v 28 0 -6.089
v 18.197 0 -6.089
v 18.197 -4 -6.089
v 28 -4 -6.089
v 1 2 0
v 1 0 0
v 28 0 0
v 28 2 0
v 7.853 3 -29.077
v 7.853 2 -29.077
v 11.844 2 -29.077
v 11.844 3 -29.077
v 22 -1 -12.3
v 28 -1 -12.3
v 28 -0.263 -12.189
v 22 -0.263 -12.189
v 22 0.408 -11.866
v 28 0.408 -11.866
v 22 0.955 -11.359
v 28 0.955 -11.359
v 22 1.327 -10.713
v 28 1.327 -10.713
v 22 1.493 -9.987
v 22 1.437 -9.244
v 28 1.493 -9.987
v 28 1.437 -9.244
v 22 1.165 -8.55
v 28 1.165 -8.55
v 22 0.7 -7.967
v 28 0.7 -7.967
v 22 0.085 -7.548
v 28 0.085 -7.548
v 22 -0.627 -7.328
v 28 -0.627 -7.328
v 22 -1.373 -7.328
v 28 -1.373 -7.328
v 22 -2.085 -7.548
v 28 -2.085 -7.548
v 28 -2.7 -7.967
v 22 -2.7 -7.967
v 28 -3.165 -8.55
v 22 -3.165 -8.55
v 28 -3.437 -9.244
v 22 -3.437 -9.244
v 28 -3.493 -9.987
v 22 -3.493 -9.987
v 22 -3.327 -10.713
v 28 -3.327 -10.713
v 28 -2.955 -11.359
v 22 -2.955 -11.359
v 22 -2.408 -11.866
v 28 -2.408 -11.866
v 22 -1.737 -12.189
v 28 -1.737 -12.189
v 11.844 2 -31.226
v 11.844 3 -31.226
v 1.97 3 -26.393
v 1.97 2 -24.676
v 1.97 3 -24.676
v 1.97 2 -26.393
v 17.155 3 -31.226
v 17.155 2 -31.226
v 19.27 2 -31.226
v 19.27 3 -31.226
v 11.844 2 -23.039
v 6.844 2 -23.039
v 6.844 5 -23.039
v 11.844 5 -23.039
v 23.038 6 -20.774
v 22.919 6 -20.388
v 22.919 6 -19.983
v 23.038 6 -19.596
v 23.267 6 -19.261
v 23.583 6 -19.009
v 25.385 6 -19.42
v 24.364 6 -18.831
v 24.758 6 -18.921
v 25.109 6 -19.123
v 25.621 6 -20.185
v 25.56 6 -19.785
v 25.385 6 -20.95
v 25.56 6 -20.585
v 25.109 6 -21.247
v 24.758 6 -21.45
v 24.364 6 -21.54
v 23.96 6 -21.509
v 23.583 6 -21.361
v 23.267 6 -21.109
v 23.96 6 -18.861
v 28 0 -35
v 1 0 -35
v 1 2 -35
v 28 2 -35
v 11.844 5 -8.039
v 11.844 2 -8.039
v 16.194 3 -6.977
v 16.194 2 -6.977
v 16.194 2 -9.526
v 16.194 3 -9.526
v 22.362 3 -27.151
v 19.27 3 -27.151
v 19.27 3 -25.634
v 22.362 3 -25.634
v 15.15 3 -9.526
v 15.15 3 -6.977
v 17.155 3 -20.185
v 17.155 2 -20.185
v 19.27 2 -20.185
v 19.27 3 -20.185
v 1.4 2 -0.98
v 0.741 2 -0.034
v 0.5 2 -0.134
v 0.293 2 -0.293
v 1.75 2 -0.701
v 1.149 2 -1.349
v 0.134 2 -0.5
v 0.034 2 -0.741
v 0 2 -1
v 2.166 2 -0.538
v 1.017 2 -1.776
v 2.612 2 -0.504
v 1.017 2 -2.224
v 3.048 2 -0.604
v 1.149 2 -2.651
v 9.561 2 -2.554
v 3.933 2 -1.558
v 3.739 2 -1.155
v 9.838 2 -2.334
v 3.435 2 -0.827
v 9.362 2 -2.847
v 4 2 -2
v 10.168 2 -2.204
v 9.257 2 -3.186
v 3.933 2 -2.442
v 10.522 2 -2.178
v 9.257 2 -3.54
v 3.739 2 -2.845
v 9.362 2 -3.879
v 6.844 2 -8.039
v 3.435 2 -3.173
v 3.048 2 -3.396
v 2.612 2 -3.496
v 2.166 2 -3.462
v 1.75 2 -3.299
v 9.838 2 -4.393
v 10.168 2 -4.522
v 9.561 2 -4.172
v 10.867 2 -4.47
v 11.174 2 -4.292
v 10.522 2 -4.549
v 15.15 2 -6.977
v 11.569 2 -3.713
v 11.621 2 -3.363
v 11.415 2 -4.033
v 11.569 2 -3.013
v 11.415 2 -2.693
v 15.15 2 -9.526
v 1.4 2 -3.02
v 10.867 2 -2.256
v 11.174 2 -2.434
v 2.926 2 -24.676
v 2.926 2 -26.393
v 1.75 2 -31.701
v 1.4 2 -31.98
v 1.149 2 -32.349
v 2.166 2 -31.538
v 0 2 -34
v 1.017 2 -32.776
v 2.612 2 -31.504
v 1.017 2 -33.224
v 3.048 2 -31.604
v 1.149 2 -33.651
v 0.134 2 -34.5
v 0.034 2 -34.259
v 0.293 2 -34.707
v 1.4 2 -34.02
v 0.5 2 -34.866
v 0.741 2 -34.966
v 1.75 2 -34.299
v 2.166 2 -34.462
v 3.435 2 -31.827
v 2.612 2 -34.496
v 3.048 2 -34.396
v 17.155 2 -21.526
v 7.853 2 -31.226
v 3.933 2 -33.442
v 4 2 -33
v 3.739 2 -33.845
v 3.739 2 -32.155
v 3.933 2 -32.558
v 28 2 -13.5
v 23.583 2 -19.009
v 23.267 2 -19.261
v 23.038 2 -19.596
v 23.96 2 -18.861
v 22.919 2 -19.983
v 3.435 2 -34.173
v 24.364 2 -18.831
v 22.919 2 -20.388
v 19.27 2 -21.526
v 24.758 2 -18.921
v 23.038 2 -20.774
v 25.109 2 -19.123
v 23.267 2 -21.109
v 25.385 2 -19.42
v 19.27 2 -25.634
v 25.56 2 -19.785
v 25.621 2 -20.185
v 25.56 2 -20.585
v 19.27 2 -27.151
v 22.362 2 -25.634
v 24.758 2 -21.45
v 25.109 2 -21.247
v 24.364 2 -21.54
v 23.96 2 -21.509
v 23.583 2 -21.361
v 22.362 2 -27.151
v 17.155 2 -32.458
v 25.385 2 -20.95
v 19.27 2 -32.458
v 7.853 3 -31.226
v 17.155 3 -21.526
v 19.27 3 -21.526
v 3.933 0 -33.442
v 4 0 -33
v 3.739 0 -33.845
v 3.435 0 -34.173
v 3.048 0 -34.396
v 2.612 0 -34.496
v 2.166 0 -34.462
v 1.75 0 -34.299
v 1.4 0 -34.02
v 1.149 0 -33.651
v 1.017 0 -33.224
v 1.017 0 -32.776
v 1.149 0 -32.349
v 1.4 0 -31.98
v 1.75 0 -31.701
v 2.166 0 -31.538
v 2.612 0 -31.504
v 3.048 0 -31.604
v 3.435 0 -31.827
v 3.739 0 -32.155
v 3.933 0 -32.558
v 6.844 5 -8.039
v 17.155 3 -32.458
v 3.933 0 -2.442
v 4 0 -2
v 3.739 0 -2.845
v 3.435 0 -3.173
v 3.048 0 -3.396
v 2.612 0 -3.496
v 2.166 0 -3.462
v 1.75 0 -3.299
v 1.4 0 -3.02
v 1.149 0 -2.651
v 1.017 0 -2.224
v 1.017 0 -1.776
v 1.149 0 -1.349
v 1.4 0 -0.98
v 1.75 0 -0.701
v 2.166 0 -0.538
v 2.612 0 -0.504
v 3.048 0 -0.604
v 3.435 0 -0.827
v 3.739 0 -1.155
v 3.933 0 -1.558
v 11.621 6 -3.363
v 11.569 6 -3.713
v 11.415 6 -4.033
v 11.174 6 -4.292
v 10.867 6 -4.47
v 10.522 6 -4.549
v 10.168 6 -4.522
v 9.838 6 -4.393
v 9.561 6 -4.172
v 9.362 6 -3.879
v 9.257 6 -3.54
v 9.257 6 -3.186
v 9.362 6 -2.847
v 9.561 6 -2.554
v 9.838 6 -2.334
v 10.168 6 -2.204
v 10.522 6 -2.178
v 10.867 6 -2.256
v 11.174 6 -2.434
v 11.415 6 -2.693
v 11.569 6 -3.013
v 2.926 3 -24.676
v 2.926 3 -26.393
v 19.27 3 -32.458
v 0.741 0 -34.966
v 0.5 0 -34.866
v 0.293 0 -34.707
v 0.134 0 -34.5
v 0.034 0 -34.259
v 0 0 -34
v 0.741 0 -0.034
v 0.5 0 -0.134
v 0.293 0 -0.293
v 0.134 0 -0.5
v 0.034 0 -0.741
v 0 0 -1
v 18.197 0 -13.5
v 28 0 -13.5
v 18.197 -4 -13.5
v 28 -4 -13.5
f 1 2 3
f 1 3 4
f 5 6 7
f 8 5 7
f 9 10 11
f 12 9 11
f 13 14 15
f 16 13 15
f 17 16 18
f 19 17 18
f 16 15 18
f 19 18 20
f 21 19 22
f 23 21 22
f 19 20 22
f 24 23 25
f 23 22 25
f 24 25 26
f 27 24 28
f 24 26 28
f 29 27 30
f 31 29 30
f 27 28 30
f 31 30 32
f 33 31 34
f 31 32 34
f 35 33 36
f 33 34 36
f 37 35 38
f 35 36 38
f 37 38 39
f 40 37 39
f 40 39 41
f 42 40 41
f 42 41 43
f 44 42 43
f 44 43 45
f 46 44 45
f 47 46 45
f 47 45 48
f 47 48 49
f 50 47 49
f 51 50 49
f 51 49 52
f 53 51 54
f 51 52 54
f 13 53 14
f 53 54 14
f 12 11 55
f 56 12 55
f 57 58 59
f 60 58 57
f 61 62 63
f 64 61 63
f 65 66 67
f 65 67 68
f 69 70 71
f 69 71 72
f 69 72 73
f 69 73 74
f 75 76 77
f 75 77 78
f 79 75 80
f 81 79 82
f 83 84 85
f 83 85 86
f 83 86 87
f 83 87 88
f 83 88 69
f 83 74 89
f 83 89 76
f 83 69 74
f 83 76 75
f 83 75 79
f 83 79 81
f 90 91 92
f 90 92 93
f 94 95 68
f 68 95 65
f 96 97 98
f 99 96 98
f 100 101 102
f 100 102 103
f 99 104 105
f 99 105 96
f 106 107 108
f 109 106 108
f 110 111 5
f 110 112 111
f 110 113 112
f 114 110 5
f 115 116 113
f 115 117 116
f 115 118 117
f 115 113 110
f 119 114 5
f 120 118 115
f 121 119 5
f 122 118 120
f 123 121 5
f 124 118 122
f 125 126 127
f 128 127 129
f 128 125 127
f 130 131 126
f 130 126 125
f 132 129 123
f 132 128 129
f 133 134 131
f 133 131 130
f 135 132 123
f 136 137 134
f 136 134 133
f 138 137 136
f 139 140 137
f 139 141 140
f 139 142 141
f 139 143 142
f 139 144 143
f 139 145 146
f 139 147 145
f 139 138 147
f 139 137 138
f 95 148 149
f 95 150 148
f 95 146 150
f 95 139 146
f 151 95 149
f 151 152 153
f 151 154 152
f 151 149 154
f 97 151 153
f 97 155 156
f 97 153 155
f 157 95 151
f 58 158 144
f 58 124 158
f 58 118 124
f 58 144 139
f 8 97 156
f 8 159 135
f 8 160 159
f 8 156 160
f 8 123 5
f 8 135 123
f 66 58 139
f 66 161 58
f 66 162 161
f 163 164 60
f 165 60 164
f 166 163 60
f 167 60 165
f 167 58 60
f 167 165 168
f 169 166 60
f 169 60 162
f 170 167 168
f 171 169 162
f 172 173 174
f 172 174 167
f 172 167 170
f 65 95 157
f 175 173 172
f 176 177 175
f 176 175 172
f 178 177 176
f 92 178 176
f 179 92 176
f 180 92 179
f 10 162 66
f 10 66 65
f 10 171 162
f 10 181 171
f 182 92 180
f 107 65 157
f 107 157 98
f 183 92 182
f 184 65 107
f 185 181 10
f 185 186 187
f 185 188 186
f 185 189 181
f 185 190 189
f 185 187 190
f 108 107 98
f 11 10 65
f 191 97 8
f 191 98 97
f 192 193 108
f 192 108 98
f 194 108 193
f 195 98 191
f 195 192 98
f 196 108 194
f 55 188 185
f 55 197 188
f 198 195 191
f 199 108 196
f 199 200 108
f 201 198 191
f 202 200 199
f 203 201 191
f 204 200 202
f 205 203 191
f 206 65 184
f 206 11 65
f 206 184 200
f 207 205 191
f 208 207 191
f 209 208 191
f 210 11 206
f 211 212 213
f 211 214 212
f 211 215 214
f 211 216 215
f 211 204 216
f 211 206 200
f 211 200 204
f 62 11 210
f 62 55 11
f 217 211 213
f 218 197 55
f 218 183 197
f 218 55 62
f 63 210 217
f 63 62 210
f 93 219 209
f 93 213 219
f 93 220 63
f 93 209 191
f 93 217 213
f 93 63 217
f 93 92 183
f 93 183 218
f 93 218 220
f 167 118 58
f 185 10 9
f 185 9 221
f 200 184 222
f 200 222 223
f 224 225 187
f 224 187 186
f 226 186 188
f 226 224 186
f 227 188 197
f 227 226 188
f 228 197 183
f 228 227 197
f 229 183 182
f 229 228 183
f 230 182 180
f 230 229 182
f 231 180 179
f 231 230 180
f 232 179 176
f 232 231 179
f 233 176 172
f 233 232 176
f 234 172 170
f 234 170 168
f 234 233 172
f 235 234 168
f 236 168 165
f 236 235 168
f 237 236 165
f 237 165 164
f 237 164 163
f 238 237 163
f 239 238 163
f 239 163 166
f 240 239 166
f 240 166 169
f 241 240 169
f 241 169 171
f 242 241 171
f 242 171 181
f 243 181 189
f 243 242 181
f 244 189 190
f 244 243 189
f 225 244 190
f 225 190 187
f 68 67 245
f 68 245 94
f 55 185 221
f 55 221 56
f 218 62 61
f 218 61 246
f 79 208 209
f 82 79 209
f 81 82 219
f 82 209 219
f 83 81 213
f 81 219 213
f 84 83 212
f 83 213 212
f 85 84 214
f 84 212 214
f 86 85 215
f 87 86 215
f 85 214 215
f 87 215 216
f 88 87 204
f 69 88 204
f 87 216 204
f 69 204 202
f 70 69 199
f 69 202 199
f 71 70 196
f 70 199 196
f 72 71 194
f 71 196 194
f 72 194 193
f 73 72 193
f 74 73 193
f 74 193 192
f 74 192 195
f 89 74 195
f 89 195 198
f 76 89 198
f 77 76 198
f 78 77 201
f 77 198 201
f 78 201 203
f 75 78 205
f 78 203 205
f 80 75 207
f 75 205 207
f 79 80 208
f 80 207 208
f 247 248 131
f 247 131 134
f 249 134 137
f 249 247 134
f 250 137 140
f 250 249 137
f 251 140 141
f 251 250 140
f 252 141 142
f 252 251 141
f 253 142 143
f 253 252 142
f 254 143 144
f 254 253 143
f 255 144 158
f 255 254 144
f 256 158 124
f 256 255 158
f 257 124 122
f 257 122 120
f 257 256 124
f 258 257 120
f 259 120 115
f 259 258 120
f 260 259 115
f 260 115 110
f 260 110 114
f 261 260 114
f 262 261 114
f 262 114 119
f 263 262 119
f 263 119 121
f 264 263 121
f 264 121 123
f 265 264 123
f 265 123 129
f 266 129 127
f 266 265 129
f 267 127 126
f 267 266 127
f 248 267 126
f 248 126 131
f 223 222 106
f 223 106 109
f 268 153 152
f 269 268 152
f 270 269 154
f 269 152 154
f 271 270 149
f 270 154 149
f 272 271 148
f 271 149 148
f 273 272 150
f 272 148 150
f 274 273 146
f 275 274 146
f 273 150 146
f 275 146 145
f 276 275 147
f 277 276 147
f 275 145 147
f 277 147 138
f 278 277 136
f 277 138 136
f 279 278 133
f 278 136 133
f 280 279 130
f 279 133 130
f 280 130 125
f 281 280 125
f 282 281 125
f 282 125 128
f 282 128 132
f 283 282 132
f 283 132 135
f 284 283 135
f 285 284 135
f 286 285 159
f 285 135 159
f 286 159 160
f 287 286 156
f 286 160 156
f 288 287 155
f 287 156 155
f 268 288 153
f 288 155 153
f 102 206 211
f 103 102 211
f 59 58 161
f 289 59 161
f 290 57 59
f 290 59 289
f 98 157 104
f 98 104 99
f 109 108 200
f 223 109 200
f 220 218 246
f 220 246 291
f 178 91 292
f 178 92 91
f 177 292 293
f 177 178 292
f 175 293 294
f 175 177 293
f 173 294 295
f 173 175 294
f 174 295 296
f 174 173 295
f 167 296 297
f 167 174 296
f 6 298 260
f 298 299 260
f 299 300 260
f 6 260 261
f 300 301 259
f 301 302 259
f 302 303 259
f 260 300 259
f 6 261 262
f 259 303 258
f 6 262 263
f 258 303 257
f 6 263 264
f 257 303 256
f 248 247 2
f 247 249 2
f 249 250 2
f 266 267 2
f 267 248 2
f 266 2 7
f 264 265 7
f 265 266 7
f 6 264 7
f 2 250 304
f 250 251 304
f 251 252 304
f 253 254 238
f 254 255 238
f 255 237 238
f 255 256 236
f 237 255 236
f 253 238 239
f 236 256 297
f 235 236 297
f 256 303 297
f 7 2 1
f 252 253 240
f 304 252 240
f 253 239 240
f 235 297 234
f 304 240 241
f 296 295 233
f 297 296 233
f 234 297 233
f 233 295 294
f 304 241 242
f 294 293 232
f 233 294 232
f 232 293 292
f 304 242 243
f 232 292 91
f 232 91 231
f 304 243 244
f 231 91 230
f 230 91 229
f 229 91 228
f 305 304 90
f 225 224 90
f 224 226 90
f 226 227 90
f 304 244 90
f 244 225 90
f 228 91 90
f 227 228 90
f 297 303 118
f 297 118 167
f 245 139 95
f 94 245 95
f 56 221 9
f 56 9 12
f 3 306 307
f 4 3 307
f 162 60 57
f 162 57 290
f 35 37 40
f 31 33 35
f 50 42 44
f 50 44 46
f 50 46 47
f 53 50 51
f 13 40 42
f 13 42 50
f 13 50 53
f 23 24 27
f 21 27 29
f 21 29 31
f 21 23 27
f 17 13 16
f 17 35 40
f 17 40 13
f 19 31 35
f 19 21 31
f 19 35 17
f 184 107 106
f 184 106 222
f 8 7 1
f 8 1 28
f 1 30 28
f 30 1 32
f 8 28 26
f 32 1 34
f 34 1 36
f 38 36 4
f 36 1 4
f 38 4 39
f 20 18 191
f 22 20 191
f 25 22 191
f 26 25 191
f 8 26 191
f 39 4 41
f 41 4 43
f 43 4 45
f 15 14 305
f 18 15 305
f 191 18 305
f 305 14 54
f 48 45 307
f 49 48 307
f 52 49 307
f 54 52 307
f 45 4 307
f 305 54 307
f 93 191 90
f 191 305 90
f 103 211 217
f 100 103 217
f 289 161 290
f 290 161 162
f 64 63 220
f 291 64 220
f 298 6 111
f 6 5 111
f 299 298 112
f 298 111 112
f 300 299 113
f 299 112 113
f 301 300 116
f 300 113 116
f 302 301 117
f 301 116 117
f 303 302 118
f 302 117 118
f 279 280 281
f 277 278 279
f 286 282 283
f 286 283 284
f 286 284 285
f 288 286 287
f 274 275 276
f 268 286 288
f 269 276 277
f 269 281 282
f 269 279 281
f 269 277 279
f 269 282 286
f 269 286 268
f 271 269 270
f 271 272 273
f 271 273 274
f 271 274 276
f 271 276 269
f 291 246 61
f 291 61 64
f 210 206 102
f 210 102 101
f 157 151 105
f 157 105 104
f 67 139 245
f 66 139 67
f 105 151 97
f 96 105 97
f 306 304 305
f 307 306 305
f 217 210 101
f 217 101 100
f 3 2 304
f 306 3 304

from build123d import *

# Parameters (mm, degrees)
SKETCH1_W           = 28
SKETCH1_H           = 35
SKETCH1_R           = 1.5
BOSS_EXTRUDE1_DEPTH = 2
SKETCH2_W           = 9.803487011
SKETCH2_H           = 7.411177961
BOSS_EXTRUDE2_DEPTH = 6
SKETCH2_3_W         = 5
SKETCH2_3_H         = 15
BOSS_EXTRUDE3_DEPTH = 3
SKETCH2_4_R         = 1.188771684
SKETCH2_4_R_2       = 1.358321726
BOSS_EXTRUDE4_DEPTH = 4
SKETCH2_5_W         = 3.990758571
SKETCH2_5_H         = 2.149147788
SKETCH2_5_W_2       = 2.114664683
SKETCH2_5_H_2       = 1.232229244
SKETCH2_5_W_3       = 3.092189454
SKETCH2_5_H_3       = 1.517885082
SKETCH2_5_H_4       = 1.341337727
SKETCH2_5_W_4       = 1.043883653
SKETCH2_5_H_5       = 2.549502456
SKETCH2_5_W_5       = 0.955721455
SKETCH2_5_H_6       = 1.716190389
BOSS_EXTRUDE5_DEPTH = 1
FILLET1_R           = 1
SKETCH3_R           = 2.5
CUT_EXTRUDE1_DEPTH  = 6


with BuildPart() as part:
    # Sketch1 → Boss-Extrude1 (new body)
    with BuildSketch(Plane(origin=(0, 0, 0), x_dir=(1, 0, 0), z_dir=(0, 1, 0))):
        with Locations((14, 17.5)):
            Rectangle(SKETCH1_W, SKETCH1_H)
        with Locations((2.5, 2)):
            Circle(SKETCH1_R, mode=Mode.SUBTRACT)
        with Locations((2.5, 33)):
            Circle(SKETCH1_R, mode=Mode.SUBTRACT)
    extrude(amount=BOSS_EXTRUDE1_DEPTH)

    # Sketch2 → Boss-Extrude2 (add)
    with BuildSketch(Plane(origin=(0, 2, 0), x_dir=(1, 0, 0), z_dir=(0, 1, 0))):
        with Locations((23.098256494, 9.79441102)):
            Rectangle(SKETCH2_W, SKETCH2_H)
    extrude(amount=-BOSS_EXTRUDE2_DEPTH)

    # Sketch2<3> → Boss-Extrude3 (add)
    with BuildSketch(Plane(origin=(0, 2, 0), x_dir=(1, 0, 0), z_dir=(0, 1, 0))):
        with Locations((9.343972274, 15.538611718)):
            Rectangle(SKETCH2_3_W, SKETCH2_3_H)
    extrude(amount=BOSS_EXTRUDE3_DEPTH)

    # Sketch2<4> → Boss-Extrude4 (add)
    with BuildSketch(Plane(origin=(0, 2, 0), x_dir=(1, 0, 0), z_dir=(0, 1, 0))):
        with Locations((10.43268107, 3.363069922)):
            Circle(SKETCH2_4_R)
        with Locations((24.262223339, 20.185094641)):
            Circle(SKETCH2_4_R_2)
    extrude(amount=BOSS_EXTRUDE4_DEPTH)

    # Sketch2<5> → Boss-Extrude5 (add)
    with BuildSketch(Plane(origin=(0, 2, 0), x_dir=(1, 0, 0), z_dir=(0, 1, 0))):
        with Locations((9.848592989, 30.151261091)):
            Rectangle(SKETCH2_5_W, SKETCH2_5_H)
        with Locations((18.212826519, 31.841949607)):
            Rectangle(SKETCH2_5_W_2, SKETCH2_5_H_2)
        with Locations((20.816253587, 26.392524838)):
            Rectangle(SKETCH2_5_W_3, SKETCH2_5_H_3)
        with Locations((18.212826519, 20.855763505)):
            Rectangle(SKETCH2_5_W_2, SKETCH2_5_H_4)
        with Locations((15.671715961, 8.251316283)):
            Rectangle(SKETCH2_5_W_4, SKETCH2_5_H_5)
        with Locations((2.447985743, 25.534429644)):
            Rectangle(SKETCH2_5_W_5, SKETCH2_5_H_6)
    extrude(amount=BOSS_EXTRUDE5_DEPTH)

    # Fillet1
    fillet1_edges = [part.edges().sort_by_distance(p)[0] for p in [
        (0, 1, -35),
        (0, 1, 0),
    ]]
    fillet(fillet1_edges, radius=FILLET1_R)

    # Sketch3 → Cut-Extrude1 (cut)
    with BuildSketch(Plane(origin=(28, 0, 0), x_dir=(0, 0, -1), z_dir=(1, 0, 0))):
        with Locations((9.8, -1)):
            Circle(SKETCH3_R)
    extrude(amount=-CUT_EXTRUDE1_DEPTH, mode=Mode.SUBTRACT)


solid = part.part
